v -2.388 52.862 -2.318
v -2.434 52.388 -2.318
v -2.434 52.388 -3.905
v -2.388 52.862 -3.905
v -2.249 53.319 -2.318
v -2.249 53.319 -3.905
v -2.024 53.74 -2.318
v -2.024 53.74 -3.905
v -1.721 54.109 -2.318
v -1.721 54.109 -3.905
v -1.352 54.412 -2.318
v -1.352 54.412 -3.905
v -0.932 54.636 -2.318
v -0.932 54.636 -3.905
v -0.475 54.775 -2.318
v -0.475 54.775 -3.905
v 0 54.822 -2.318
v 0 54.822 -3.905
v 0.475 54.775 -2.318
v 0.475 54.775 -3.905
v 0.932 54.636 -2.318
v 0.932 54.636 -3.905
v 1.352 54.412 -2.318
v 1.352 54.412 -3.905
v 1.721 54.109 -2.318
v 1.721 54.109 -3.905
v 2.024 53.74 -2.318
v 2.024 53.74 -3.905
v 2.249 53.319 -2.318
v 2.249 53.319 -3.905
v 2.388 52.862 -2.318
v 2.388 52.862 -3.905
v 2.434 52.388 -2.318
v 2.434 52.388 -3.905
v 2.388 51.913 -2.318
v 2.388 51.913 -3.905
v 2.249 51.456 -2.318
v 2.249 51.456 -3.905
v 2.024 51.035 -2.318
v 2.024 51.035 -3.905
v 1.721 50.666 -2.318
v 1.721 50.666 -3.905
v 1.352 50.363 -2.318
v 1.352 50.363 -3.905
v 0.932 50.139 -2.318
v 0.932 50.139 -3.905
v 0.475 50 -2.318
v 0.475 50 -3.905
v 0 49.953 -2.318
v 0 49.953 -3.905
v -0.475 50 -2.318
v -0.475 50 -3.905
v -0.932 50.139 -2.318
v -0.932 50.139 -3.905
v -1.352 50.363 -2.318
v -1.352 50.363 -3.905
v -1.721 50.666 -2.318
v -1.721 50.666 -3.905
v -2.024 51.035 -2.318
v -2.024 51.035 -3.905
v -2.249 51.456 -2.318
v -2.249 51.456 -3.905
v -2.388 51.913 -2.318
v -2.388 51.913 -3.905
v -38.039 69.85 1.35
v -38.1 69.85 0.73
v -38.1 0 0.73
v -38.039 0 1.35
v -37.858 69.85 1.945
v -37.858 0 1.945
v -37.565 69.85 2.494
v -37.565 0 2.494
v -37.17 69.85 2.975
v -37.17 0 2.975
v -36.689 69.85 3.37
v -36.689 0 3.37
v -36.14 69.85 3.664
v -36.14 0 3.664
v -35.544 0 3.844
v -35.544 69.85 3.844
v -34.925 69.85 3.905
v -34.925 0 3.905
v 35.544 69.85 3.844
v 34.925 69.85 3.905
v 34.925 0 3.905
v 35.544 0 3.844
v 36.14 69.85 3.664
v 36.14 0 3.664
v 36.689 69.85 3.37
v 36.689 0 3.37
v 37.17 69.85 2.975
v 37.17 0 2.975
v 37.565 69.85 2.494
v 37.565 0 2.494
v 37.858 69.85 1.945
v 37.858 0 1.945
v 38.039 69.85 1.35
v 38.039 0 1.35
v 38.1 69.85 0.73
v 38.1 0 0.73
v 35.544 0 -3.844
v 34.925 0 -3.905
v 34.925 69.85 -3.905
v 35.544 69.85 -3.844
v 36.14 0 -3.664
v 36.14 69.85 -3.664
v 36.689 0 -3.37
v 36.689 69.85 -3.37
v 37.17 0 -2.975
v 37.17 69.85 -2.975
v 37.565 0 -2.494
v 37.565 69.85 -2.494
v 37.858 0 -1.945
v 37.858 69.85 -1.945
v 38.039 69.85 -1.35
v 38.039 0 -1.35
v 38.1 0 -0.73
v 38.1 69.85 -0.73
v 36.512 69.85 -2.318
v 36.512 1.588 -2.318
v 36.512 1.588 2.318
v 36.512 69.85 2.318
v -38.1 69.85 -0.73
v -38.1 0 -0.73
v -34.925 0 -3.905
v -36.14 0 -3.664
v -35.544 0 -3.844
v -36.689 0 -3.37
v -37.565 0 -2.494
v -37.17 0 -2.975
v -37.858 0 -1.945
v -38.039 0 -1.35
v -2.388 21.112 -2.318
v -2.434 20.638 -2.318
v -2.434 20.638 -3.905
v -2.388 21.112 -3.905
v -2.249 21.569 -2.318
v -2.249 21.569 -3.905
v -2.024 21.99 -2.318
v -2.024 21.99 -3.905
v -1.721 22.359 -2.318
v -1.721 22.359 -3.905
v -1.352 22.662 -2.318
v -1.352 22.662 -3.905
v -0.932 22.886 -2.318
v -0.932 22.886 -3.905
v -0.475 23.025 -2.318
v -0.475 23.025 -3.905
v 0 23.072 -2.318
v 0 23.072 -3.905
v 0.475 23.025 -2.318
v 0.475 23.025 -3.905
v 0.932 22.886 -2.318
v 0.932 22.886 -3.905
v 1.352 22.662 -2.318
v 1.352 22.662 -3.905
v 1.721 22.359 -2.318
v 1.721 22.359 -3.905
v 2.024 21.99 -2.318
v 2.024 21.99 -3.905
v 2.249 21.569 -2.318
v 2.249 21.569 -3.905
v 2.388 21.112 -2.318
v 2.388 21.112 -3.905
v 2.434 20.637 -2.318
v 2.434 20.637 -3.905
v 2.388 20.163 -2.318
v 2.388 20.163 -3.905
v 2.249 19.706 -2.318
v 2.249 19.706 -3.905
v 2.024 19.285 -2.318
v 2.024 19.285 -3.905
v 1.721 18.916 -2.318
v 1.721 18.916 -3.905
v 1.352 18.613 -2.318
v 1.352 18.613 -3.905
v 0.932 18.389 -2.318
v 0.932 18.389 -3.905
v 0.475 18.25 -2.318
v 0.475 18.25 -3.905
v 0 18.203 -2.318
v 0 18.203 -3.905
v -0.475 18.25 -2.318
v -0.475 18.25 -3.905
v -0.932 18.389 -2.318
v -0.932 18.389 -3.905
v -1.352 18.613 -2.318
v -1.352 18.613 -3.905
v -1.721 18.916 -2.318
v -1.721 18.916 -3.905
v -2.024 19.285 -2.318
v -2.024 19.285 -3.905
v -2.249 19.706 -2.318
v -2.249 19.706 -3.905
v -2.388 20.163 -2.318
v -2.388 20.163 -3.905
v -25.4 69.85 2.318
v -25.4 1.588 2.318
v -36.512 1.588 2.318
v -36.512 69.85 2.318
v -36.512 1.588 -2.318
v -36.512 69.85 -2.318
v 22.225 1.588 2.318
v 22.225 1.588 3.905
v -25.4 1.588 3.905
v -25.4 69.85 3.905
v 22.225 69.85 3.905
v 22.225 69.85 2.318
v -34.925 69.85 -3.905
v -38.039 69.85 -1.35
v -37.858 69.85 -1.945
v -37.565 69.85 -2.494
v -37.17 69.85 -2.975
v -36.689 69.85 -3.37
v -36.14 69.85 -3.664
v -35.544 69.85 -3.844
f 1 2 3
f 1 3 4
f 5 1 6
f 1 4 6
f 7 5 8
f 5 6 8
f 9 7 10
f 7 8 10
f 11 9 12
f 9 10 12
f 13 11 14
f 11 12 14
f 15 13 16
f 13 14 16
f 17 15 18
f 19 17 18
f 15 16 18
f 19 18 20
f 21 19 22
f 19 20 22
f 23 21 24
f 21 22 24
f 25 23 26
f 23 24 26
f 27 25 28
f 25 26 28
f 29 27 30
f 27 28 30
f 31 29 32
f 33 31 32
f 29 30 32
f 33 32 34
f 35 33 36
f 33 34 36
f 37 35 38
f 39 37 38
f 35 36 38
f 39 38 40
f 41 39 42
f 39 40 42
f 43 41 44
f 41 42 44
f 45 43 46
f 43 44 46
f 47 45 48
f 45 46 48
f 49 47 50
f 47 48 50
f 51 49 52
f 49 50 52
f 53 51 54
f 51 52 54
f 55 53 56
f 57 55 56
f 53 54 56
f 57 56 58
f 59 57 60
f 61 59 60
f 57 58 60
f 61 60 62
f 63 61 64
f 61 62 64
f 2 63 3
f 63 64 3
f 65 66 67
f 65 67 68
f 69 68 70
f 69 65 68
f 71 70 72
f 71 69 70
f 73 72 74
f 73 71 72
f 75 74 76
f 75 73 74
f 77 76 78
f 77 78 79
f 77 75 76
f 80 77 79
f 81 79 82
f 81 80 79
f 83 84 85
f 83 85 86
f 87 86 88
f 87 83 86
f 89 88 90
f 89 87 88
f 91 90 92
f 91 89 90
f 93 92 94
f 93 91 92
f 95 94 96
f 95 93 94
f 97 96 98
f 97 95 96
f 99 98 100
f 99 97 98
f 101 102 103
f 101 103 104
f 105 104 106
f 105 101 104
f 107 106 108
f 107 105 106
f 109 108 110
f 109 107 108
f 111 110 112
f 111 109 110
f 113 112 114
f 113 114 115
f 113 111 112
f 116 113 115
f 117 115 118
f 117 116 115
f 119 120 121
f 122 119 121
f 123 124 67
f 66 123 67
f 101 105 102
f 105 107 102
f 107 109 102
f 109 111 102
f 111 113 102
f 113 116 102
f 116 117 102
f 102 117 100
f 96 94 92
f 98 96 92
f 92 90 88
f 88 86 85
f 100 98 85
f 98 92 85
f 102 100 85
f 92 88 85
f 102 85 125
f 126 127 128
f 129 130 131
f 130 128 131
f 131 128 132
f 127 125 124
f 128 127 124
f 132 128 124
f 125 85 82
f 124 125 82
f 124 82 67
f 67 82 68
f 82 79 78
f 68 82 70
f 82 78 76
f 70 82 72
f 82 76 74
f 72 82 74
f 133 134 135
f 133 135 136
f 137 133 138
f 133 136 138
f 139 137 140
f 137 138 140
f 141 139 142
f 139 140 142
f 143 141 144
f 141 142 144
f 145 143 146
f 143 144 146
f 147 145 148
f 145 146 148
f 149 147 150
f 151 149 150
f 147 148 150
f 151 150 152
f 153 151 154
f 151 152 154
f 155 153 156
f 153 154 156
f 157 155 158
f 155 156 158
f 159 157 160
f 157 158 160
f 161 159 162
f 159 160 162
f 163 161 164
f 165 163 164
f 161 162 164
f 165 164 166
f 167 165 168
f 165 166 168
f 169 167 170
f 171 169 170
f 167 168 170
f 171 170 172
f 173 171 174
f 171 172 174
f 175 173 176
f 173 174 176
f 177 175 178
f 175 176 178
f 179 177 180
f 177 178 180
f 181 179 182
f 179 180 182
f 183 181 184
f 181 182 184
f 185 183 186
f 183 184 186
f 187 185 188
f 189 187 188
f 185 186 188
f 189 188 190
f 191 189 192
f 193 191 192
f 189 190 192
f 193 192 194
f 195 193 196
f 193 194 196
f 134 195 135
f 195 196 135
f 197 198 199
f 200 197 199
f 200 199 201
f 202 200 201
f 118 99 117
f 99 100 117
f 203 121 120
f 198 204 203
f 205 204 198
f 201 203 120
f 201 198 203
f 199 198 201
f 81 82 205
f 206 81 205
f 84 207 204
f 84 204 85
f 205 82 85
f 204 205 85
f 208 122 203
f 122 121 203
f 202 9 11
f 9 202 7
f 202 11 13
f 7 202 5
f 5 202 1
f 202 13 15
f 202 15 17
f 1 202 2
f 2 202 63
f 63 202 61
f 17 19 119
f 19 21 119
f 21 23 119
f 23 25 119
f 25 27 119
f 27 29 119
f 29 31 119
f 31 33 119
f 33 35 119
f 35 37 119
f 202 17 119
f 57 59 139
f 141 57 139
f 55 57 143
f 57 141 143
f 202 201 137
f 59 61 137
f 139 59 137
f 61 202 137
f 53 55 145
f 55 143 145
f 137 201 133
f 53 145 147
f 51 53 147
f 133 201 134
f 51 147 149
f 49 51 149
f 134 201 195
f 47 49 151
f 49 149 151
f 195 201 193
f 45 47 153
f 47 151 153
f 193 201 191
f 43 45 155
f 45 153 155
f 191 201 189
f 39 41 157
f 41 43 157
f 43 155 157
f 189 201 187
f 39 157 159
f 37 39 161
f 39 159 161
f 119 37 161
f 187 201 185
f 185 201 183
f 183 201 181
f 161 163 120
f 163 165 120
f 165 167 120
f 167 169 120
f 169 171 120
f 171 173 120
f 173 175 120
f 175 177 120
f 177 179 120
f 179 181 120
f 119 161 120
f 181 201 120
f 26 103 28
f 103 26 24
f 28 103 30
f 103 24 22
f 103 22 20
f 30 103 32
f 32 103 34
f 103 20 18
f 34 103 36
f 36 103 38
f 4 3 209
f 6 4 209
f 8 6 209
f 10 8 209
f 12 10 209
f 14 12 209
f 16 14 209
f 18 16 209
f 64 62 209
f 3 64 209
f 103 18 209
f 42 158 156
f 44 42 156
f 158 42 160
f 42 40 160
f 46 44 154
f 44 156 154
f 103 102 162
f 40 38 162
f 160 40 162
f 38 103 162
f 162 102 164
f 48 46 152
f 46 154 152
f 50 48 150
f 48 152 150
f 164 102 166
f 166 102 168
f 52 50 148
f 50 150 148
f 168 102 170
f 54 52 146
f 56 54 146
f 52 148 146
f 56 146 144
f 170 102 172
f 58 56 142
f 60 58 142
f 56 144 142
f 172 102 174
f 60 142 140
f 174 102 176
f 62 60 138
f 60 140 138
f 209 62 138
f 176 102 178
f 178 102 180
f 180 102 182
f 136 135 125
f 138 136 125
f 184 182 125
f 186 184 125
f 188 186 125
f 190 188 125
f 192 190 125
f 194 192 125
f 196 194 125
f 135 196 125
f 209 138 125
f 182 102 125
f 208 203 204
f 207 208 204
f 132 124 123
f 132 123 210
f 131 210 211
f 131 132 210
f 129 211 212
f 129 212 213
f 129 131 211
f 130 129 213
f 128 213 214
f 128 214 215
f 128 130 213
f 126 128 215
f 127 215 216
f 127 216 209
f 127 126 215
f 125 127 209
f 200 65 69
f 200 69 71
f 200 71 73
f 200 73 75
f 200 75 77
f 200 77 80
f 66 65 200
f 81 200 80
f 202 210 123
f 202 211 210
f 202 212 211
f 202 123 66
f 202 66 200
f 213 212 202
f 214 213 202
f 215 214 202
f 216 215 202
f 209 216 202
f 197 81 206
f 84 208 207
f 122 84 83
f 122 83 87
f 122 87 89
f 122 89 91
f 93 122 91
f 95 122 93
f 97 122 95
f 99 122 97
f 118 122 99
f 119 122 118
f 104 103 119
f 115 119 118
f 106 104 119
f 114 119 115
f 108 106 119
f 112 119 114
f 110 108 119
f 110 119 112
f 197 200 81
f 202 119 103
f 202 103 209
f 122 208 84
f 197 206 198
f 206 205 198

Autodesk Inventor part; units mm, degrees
ref_plane "YZ Plane" through (0, 0, 0) normal (1, 0, 0) x (0, 1, 0)
ref_plane "XZ Plane" through (0, 0, 0) normal (0, 1, 0) x (-1, 0, 0)
ref_plane "XY Plane" through (0, 0, 0) normal (0, 0, 1) x (1, 0, 0)
sketch "Sketch1" plane through (0, 0, 0) normal (0, 1, 0) x (-1, 0, 0)
  line L0 (38.1, 3.9053) -> (-38.1, 3.9052)
  line L1 (-38.1, 3.9052) -> (-38.1, -3.9053)
  line L2 (-38.1, -3.9053) -> (38.1, -3.9052)
  line L3 (38.1, -3.9052) -> (38.1, 3.9053)
  line L4 (38.1, 3.9053) -> (-38.1, -3.9053) construction
  line L5 (-38.1, 3.9052) -> (38.1, -3.9052) construction
  point P0 (0, 0)
  dimension "d0" = 76.2
  dimension "d1" = 7.8105
extrude "Extrusion1" add sketch "Sketch1" along normal blind 1.5875
sketch "Sketch2" plane through (0, 1.5875, 0) normal (0, 1, 0) x (1, 0, 0)
  line L0 (-38.1, -3.9053) -> (38.1, -3.9052) projected
  line L1 (-12.7, -3.9053) -> (-25.4, -3.9053)
  line L2 (-25.4, -3.9053) -> (-25.4, -2.3178)
  line L3 (-38.1, 3.9052) -> (-38.1, -3.9053) projected
  line L4 (-25.4, -2.3178) -> (-36.5125, -2.3178)
  line L5 (-36.5125, -2.3178) -> (-36.5125, 2.3177)
  line L6 (-36.5125, 2.3177) -> (36.5125, 2.3178)
  line L7 (36.5125, 2.3178) -> (36.5125, -2.3177)
  line L8 (36.5125, -2.3177) -> (22.225, -2.3177)
  line L9 (22.225, -2.3177) -> (22.225, -3.9052)
  line L10 (38.1, -3.9052) -> (38.1, 3.9053) projected
  line L11 (38.1, 3.9053) -> (-38.1, 3.9052) projected
  line L12 (-25.4, -3.9053) -> (-38.1, -3.9053)
  line L13 (-38.1, 3.9052) -> (38.1, 3.9053)
  line L14 (38.1, -3.9052) -> (22.225, -3.9052)
  line L15 (38.1, 3.9053) -> (38.1, -3.9052)
  line L16 (-38.1, -3.9053) -> (-38.1, 3.9052)
  point P0 (0, 0)
  dimension "d5" = 12.7
  dimension "d6" = 1.5875
  dimension "d7" = 1.5875
  dimension "d8" = 1.5875
  dimension "d9" = 1.5875
  dimension "d10" = 1.5875
extrude "Extrusion2" add sketch "Sketch2" along normal blind 68.2625 contours L3 L11 L10 L0 L9 L8 L7 L6 L5 L4 L2
sketch "Sketch3" plane through (38.1, 0, -3.9053) normal (0, 0, -1) x (-1, 0, 0)
  circle A0 centre (38.1, 52.3875) radius 2.4343
  circle A1 centre (38.1, 20.6375) radius 2.4343
  line L0 (0, 69.85) -> (76.2, 69.85) projected
  point P0 (38.1, 0)
  point P1 (38.1, 69.85)
  dimension "d13" = 31.75
  dimension "d14" = 17.4625
extrude "Extrusion3" cut sketch "Sketch3" against normal blind 68.2625
fillet "Fillet1" radius 3.175 2 edges at (38.1, 34.925, -3.9053) (-38.1, 34.925, -3.9052)
fillet "Fillet2" radius 3.175 2 edges at (-38.1, 34.925, 3.9053) (38.1, 34.925, 3.9052)
properties part number "Monitor Seat v1.0"
